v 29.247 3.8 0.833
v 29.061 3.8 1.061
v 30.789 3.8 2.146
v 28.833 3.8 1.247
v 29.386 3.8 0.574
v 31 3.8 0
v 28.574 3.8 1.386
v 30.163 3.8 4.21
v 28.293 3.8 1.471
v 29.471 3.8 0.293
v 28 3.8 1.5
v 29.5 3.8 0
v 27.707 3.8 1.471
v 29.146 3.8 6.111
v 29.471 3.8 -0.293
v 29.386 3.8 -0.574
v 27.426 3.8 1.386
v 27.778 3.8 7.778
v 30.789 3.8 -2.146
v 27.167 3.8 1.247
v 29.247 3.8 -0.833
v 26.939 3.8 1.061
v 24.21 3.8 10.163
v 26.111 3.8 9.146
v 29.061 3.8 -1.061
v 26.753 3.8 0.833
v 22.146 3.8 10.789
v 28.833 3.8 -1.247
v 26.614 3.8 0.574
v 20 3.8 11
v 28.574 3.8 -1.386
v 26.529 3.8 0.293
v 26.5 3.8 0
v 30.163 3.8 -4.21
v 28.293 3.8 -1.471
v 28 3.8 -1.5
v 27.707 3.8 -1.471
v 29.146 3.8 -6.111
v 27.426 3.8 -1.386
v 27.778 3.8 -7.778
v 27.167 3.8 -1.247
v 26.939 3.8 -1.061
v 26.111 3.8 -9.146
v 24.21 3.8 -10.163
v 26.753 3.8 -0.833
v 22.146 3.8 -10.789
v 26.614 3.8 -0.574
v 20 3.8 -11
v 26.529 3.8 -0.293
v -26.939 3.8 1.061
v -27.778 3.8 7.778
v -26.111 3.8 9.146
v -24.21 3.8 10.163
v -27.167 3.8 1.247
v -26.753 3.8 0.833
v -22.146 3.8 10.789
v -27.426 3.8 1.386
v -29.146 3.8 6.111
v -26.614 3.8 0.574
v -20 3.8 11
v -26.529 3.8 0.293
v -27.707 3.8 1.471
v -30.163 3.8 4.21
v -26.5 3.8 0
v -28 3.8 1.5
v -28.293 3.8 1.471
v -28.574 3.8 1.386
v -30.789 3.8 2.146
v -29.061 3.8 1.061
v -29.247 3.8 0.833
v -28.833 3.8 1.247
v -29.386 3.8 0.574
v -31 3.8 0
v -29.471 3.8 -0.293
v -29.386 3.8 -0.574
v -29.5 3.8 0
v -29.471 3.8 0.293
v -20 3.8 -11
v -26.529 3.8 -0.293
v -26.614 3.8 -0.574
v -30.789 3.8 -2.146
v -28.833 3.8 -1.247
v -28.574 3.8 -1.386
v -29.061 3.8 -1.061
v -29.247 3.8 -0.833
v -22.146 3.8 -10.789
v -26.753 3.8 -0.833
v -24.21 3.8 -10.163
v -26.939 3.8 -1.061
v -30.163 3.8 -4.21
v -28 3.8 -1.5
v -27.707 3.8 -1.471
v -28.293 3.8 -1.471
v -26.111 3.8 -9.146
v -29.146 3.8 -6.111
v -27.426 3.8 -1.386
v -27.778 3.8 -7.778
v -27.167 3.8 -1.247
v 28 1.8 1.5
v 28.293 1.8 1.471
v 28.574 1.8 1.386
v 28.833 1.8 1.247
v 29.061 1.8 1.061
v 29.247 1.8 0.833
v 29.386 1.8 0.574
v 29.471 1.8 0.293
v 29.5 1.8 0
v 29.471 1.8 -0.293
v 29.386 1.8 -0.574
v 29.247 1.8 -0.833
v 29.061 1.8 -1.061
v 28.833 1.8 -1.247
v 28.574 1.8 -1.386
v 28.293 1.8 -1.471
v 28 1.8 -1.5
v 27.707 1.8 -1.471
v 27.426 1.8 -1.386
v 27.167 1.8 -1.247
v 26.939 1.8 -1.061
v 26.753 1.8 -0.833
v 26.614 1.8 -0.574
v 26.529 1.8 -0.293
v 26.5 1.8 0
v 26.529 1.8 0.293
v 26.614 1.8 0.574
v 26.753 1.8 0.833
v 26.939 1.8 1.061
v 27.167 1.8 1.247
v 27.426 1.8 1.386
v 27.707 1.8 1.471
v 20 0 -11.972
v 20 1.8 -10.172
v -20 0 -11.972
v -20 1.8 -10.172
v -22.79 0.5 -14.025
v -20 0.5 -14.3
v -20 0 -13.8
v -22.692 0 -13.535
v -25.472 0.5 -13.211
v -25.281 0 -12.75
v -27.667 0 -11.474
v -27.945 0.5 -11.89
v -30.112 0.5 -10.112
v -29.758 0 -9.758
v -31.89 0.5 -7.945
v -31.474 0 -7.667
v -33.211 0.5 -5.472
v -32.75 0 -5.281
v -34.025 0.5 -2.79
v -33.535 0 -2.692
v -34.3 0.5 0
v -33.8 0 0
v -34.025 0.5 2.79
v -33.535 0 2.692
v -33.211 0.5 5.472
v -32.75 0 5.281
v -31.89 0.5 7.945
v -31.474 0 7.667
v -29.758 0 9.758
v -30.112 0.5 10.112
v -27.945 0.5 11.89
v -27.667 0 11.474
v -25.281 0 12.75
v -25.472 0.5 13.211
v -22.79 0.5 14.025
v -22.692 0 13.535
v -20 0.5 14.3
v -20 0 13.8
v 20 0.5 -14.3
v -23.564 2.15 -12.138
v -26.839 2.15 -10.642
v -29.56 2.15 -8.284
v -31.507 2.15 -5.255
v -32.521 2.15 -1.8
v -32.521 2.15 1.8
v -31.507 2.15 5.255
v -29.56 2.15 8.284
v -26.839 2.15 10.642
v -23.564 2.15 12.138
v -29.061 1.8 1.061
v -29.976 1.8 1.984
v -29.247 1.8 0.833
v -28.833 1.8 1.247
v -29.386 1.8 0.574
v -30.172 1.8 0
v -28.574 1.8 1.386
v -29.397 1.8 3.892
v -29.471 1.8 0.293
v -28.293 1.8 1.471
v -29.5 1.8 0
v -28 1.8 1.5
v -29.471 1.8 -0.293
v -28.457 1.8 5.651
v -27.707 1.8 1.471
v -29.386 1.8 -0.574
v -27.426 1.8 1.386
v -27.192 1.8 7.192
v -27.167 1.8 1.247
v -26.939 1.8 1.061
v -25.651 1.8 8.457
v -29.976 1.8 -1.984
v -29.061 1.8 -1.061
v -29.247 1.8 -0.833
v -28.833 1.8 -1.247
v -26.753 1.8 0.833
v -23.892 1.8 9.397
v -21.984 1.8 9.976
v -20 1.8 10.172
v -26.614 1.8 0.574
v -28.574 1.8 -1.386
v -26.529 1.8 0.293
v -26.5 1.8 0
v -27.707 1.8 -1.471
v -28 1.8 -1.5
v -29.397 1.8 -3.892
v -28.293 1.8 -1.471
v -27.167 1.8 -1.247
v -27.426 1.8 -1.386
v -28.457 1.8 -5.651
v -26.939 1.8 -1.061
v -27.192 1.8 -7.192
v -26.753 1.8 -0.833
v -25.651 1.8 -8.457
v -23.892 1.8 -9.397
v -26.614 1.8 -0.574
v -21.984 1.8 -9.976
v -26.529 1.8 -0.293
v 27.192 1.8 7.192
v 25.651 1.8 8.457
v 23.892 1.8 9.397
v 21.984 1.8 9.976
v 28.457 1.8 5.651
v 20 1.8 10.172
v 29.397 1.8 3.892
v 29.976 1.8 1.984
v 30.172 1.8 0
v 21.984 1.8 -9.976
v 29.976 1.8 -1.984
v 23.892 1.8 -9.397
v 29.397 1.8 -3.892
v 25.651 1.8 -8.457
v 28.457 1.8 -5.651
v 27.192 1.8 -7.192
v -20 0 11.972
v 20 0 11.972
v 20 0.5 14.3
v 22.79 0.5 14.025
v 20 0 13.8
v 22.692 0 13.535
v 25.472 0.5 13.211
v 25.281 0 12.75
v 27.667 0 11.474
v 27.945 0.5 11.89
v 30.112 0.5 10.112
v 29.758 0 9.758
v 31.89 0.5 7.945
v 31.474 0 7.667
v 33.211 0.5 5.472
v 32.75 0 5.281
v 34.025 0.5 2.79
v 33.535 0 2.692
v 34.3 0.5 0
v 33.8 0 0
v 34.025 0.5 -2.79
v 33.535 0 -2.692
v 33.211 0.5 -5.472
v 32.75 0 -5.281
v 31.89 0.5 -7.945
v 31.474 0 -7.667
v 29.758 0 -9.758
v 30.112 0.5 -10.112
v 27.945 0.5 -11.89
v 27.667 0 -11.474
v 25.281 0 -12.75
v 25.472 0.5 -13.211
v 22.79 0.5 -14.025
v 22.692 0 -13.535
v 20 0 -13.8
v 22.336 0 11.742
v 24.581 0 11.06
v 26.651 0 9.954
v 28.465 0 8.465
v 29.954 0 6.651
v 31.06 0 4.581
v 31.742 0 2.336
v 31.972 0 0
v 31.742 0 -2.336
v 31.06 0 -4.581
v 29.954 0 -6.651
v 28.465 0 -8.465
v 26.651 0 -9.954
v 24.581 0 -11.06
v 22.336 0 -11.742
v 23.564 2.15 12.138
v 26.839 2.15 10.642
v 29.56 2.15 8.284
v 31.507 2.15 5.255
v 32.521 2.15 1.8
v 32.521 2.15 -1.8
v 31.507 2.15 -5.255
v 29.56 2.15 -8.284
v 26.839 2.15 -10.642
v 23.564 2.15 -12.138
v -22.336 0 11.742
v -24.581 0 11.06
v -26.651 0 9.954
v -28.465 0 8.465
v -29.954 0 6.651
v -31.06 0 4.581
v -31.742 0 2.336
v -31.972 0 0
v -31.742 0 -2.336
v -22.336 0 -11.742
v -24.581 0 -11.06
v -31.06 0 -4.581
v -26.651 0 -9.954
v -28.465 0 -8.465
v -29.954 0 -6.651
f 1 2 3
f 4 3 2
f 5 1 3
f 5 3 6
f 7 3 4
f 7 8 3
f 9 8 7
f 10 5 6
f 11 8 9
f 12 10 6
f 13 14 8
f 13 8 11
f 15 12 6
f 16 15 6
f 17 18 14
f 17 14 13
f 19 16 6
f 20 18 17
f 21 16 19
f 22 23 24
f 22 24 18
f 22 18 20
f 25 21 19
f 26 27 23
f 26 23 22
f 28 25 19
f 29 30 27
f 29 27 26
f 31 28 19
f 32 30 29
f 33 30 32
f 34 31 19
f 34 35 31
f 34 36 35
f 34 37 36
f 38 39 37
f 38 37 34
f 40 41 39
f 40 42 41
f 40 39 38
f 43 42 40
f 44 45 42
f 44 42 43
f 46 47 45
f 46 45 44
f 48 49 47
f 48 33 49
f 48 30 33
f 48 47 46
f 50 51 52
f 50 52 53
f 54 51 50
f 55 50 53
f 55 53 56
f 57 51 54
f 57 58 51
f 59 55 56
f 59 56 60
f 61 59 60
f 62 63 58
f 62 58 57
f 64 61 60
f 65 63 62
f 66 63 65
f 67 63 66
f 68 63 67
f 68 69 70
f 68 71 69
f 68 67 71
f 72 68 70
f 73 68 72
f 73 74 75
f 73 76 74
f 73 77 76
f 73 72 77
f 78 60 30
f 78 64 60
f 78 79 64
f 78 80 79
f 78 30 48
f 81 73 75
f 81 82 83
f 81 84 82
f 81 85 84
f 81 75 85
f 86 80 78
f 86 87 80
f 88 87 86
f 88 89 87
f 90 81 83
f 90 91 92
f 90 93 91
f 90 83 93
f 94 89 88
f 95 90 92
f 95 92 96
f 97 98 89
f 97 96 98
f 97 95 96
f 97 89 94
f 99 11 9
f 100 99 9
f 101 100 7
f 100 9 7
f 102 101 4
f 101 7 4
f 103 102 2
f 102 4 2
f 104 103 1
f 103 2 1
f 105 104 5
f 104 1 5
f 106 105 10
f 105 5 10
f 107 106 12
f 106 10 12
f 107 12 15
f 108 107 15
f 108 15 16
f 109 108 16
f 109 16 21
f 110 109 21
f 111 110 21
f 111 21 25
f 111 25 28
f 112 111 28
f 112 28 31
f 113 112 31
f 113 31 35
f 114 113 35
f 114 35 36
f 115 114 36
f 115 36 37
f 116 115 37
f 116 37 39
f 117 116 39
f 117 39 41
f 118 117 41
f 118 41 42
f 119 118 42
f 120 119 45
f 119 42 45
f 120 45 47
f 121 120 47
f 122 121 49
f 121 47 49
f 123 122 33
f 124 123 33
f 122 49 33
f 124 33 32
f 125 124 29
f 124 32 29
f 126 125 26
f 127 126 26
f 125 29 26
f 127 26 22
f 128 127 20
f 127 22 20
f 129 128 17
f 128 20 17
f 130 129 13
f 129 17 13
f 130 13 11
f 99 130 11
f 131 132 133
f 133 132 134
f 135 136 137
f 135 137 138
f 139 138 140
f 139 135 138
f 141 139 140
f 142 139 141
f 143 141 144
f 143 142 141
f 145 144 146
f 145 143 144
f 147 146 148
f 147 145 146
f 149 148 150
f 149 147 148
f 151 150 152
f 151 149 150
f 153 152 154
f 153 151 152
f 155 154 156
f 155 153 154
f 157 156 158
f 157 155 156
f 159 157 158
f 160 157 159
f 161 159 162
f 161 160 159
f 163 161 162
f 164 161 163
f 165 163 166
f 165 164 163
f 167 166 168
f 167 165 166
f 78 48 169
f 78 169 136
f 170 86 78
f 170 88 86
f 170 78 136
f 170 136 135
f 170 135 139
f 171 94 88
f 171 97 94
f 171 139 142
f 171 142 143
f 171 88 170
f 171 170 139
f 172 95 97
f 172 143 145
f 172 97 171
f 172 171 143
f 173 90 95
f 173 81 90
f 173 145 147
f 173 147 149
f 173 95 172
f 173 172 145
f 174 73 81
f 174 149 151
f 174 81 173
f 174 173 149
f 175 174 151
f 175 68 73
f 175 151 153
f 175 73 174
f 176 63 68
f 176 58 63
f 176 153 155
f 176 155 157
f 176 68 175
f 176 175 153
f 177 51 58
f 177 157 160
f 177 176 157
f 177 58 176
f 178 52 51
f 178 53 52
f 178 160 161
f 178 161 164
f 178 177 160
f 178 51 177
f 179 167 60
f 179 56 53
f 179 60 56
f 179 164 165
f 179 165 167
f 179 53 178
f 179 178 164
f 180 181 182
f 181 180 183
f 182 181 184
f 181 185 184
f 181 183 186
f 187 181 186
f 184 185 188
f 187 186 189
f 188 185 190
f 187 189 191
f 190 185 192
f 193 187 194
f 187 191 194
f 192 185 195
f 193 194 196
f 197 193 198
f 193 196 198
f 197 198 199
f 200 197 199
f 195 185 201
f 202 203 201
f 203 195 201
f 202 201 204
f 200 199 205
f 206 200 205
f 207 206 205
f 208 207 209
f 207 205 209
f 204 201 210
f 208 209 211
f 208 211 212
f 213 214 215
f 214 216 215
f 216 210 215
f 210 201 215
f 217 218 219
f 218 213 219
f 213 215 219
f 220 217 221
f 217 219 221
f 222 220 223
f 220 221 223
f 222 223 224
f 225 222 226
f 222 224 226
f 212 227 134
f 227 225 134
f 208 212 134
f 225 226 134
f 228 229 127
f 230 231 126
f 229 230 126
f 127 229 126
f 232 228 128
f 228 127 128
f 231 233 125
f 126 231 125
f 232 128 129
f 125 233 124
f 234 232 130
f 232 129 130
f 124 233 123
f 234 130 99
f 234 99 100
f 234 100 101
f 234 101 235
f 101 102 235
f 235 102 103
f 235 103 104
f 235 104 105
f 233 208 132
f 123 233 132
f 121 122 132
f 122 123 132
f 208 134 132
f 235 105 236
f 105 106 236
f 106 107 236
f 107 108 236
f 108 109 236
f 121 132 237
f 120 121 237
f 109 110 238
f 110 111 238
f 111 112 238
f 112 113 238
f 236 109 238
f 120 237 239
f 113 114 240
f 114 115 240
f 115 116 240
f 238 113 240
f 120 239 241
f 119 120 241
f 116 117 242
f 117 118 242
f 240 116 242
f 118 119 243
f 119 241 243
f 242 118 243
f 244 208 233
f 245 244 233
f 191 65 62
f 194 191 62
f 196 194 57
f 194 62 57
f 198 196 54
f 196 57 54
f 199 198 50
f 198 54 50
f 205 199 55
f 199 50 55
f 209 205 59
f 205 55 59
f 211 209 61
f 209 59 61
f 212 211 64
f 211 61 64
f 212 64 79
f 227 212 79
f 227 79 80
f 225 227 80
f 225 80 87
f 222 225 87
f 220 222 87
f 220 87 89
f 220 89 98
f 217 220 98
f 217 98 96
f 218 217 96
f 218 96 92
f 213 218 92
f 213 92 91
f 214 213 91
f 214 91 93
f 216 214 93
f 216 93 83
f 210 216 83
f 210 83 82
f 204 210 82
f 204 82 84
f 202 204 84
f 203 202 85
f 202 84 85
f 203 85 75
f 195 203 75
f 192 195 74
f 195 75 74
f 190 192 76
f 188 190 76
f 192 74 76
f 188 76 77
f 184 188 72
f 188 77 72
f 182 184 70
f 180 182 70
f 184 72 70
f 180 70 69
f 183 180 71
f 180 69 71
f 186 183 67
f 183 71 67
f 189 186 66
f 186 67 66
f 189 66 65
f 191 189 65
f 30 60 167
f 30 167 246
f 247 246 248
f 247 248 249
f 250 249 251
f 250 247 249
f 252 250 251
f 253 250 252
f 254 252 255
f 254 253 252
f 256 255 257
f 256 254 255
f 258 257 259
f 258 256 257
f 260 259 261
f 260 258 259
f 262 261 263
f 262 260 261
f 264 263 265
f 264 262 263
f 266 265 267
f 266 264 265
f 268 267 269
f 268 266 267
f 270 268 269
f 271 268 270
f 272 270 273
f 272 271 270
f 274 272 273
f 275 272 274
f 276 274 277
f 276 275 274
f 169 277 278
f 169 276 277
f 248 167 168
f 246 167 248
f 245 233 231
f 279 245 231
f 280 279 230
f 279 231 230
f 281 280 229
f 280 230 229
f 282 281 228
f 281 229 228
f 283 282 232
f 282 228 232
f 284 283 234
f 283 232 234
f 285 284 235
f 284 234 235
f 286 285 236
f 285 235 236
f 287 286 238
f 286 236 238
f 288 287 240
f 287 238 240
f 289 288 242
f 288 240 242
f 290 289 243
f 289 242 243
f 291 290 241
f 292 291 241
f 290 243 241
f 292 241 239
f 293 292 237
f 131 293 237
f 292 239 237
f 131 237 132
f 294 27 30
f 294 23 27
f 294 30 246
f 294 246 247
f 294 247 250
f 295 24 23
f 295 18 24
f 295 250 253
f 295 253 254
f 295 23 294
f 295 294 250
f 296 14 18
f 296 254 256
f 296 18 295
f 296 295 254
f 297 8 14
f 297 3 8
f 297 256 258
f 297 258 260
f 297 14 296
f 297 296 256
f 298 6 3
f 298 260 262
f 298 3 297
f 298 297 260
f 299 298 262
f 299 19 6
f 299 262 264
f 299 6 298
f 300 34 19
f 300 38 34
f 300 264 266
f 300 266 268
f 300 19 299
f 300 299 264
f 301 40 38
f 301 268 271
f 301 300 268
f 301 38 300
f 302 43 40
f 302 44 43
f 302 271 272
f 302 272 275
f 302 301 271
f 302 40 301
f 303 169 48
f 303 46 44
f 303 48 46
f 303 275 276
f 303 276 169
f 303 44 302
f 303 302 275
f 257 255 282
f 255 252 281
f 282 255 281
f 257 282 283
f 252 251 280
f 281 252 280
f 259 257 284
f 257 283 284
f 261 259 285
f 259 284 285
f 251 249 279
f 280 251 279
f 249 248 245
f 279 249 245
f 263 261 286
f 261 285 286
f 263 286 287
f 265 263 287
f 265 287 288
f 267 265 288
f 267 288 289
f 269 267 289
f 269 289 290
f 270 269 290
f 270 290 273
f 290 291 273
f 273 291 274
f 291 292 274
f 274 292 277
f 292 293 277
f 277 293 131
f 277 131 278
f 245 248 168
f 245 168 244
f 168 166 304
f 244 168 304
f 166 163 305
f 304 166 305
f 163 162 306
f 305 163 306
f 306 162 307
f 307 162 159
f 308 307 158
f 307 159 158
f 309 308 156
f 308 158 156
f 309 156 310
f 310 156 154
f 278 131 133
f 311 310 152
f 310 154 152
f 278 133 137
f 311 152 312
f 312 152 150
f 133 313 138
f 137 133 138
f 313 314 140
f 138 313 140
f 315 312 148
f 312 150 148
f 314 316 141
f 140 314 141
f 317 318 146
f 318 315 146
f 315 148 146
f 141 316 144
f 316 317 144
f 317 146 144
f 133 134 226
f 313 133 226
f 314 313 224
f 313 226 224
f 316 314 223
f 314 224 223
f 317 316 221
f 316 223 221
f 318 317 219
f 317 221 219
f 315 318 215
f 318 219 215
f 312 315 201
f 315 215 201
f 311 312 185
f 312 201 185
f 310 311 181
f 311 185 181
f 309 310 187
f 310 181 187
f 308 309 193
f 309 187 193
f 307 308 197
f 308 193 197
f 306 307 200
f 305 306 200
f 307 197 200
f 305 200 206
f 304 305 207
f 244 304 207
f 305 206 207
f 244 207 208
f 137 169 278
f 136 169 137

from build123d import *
from OCP.BRepFilletAPI import BRepFilletAPI_MakeChamfer

# Parameters (mm, degrees)
BOSS_EXTRU_1_DEPTH      = 3.8
BOSS_EXTRU_1_TAPER      = 45
COQUE2_DEPTH            = 1.8
COQUE2_DRAFT            = 45
CHANFREIN1_SIZE         = 1
CHANFREIN1_SIZE2        = 0.707106781
ENL_V_MAT_EXTRU_1_REACH = 39.355
ESQUISSE2_R             = 1.5


# Read off the part's stored shape, not the designer's step: Coque2
with BuildPart() as part:
    # Esquisse1 → Boss.-Extru.1 (new body)
    with BuildSketch(Plane(origin=(0, 0, 0), x_dir=(1, 0, 0), z_dir=(0, 1, 0))):
        with BuildLine():
            ThreePointArc((-20, 14.8), (-34.8, 0), (-20, -14.8))
            Line((-20, -14.8), (20, -14.8))
            ThreePointArc((20, -14.8), (34.8, 0), (20, 14.8))
            Line((20, 14.8), (-20, 14.8))
        make_face()
    extrude(amount=BOSS_EXTRU_1_DEPTH, taper=BOSS_EXTRU_1_TAPER)


with BuildPart() as coque2_tool:
    # Coque2 outline → Coque2 (with draft: the straight prism first)
    with BuildSketch(Plane(origin=(0, 1.8, 0), x_dir=(1, 0, 0), z_dir=(0, 1, 0))):
        with BuildLine():
            Line((-20, -10.171572875), (20, -10.171572875))
            ThreePointArc((20, -10.171572875), (30.171572875, 0), (20, 10.171572875))
            Line((20, 10.171572875), (-20, 10.171572875))
            ThreePointArc((-20, 10.171572875), (-30.171572875, 0), (-20, -10.171572875))
        make_face()
    extrude(amount=-COQUE2_DEPTH)
    # Coque2: the draft: its side faces are tilted about the plane it starts from
    coque2_sides = [coque2_tool.faces().sort_by_distance(p)[0] for p in [
        (0, 0.9, 10.171572875),
        (30.171572875, 0.9, 0),
        (0, 0.9, -10.171572875),
        (-30.171572875, 0.9, 0),
    ]]
    draft(coque2_sides, Plane(origin=(0, 1.8, 0), x_dir=(1, 0, 0), z_dir=(0, 1, 0)), COQUE2_DRAFT)


with BuildPart() as part_1:
    add(part.part)

    # Coque2: cut by coque2_tool
    add(coque2_tool.part, mode=Mode.SUBTRACT)

    # Chanfrein1: one chamfer whose edges measure the first distance from different faces: ONE call of the kernel's chamfer builder (chamfer() names one face for all edges)
    chanfrein1_edges_1 = [part_1.edges().sort_by_distance(p)[0] for p in [
        (0, 0, -14.8),
        (0, 0, 14.8),
        (-34.8, 0, 0),
    ]]
    chanfrein1_side_1 = [part_1.faces().sort_by_distance(p)[0] for p in [
        (0, 0, -14.043672029),
    ]]
    chanfrein1_edges_2 = [part_1.edges().sort_by_distance(p)[0] for p in [
        (34.8, 0, 0),
    ]]
    chanfrein1_side_2 = [part_1.faces().sort_by_distance(p)[0] for p in [
        (32.9, 1.9, 0),
    ]]
    chanfrein1 = BRepFilletAPI_MakeChamfer(part_1.part.solid().wrapped)
    for e in chanfrein1_edges_1:
        chanfrein1.Add(CHANFREIN1_SIZE, CHANFREIN1_SIZE2, e.wrapped, chanfrein1_side_1[0].wrapped)  # the first distance lies on this face
    for e in chanfrein1_edges_2:
        chanfrein1.Add(CHANFREIN1_SIZE, CHANFREIN1_SIZE2, e.wrapped, chanfrein1_side_2[0].wrapped)  # the first distance lies on this face
    add(Compound.cast(chanfrein1.Shape()), mode=Mode.REPLACE)

    # Esquisse2 → Enlèv. mat.-Extru.1 (cut, up to next)
    with BuildSketch(Plane(origin=(0, 3.8, 0), x_dir=(1, 0, 0), z_dir=(0, 1, 0)), mode=Mode.PRIVATE) as enl_v_mat_extru_1_sk1:
        with Locations(Location((-28, 0, 0), (0, 0, 270))):
            Circle(ESQUISSE2_R)
    enl_v_mat_extru_1_tool1 = extrude(enl_v_mat_extru_1_sk1.sketch, amount=-ENL_V_MAT_EXTRU_1_REACH, mode=Mode.PRIVATE) & part_1.part
    # Esquisse2 → Enlèv. mat.-Extru.1 (cut, up to next)
    with BuildSketch(Plane(origin=(0, 3.8, 0), x_dir=(1, 0, 0), z_dir=(0, 1, 0)), mode=Mode.PRIVATE) as enl_v_mat_extru_1_sk2:
        with Locations(Location((28, 0, 0), (0, 0, 270))):
            Circle(ESQUISSE2_R)
    enl_v_mat_extru_1_tool2 = extrude(enl_v_mat_extru_1_sk2.sketch, amount=-ENL_V_MAT_EXTRU_1_REACH, mode=Mode.PRIVATE) & part_1.part
    add(enl_v_mat_extru_1_tool1.solids().sort_by_distance((-28, 3.8, 0))[0], mode=Mode.SUBTRACT)
    add(enl_v_mat_extru_1_tool2.solids().sort_by_distance((28, 3.8, 0))[0], mode=Mode.SUBTRACT)


solid = part_1.part
